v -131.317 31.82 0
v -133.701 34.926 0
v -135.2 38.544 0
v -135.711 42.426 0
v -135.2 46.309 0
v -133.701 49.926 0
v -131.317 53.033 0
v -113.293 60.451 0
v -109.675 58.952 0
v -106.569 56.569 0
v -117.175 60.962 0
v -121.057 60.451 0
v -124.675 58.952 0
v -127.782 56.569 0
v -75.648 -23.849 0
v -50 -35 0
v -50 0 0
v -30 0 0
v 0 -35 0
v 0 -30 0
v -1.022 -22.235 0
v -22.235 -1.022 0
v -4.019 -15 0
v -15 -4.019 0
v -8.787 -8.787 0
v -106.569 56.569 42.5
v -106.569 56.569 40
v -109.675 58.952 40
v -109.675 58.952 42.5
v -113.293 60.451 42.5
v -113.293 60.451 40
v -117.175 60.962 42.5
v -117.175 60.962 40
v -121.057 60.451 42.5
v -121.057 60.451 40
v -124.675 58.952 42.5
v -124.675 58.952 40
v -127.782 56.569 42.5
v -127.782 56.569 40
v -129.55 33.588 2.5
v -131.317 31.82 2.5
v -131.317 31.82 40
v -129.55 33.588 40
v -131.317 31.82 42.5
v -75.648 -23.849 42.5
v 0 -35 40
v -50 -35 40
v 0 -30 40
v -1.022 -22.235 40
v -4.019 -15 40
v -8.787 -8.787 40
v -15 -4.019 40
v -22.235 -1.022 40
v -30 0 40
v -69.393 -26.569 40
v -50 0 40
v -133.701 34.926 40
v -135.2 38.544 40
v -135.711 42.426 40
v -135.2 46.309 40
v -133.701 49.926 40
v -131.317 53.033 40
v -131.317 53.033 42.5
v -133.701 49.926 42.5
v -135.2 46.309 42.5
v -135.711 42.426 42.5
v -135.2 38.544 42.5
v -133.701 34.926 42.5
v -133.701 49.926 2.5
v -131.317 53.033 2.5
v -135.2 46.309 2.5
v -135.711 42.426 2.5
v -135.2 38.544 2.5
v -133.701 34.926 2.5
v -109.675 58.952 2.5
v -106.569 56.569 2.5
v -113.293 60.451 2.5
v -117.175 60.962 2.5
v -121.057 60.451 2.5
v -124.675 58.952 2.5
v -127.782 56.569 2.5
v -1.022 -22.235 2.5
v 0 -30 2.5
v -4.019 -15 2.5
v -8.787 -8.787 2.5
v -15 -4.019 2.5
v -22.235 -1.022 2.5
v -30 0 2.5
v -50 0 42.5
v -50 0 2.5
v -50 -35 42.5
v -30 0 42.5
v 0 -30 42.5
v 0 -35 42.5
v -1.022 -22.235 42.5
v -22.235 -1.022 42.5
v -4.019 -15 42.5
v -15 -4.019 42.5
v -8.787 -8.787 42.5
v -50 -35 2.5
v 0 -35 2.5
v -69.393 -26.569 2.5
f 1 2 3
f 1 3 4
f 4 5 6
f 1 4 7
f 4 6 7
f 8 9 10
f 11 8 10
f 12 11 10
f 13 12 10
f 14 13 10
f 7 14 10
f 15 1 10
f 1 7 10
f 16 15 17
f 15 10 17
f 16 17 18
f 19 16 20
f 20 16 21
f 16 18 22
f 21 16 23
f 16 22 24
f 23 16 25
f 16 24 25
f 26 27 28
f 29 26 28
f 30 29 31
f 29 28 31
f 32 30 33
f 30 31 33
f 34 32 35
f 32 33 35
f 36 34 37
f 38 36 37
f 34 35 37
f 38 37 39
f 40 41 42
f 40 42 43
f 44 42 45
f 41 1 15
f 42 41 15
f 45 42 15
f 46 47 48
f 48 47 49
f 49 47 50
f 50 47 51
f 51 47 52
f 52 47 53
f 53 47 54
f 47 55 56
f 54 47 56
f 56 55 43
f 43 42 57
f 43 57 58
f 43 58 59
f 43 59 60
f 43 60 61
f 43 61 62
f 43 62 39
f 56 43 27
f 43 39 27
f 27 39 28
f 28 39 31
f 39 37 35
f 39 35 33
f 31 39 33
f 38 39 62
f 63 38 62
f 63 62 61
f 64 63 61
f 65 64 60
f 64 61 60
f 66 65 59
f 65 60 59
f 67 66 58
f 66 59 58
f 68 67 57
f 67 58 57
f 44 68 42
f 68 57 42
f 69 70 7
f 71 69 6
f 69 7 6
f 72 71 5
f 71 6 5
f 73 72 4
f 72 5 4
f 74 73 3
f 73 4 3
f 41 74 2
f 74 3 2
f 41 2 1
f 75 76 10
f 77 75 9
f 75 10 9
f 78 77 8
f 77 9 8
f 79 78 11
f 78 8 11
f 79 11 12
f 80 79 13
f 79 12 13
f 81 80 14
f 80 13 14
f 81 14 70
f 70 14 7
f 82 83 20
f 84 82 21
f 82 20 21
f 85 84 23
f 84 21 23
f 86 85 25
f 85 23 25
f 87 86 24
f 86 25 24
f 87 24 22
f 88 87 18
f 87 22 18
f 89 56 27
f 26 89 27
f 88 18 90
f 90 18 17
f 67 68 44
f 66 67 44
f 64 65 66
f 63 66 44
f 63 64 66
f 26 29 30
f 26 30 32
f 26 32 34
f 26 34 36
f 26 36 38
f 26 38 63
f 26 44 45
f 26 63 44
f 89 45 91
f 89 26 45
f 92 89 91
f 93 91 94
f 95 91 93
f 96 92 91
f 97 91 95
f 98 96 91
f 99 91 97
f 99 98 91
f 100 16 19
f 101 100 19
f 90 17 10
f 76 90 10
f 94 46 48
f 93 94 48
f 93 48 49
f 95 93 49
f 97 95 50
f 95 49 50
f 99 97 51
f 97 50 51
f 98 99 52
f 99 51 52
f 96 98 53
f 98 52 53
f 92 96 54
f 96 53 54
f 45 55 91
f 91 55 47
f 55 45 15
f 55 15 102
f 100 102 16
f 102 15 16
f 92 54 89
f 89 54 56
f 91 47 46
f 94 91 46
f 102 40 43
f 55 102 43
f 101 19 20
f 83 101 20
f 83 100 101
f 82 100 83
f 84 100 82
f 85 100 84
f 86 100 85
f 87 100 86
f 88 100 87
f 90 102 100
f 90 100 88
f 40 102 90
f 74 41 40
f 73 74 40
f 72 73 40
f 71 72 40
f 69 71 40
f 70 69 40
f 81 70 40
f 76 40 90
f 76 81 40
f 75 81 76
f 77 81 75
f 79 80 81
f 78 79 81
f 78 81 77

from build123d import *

# Parameters (mm, degrees)
BOSS_EXTRUDE1_DEPTH = 42.5
SHELL3_START        = -130.355339059
SHELL3_OUTLINE_W    = 56.855339059
SHELL3_OUTLINE_H    = 37.5
SHELL3_DEPTH        = 155.104076401
SHELL3_2_OUTLINE_W  = 4.144660941
SHELL3_2_OUTLINE_H  = 37.5
SHELL3_2_DEPTH      = 15


# Read off the part's stored shape, not the designer's step: Shell3
with BuildPart() as part:
    # Sketch1 → Boss-Extrude1 (new body)
    with BuildSketch(Plane.XY):
        with BuildLine():
            Line((-30, 0), (-50, 0))
            Line((-50, 0), (-106.568542495, 56.568542495))
            ThreePointArc((-106.568542495, 56.568542495), (-117.175144213, 60.961940777), (-127.781745931, 56.568542495))
            Line((-127.781745931, 56.568542495), (-131.317279836, 53.033008589))
            ThreePointArc((-131.317279836, 53.033008589), (-135.710678119, 42.426406871), (-131.317279836, 31.819805153))
            Line((-131.317279836, 31.819805153), (-75.648177206, -23.849297477))
            Line((-75.648177206, -23.849297477), (-50, -35))
            Line((-50, -35), (0, -35))
            Line((0, -35), (0, -30))
            ThreePointArc((0, -30), (-8.786796564, -8.786796564), (-30, 0))
        make_face()
    extrude(amount=BOSS_EXTRUDE1_DEPTH)

    # Shell3 outline → Shell3 (cut)
    with BuildSketch(Plane(origin=(0, 0, 0), x_dir=(0.7071067811865431, 0.707106781186552, 0), z_dir=(0.707106781186552, -0.707106781186543, 0)).offset(SHELL3_START)):
        with Locations((-39.42766953, 21.25)):
            Rectangle(SHELL3_OUTLINE_W, SHELL3_OUTLINE_H)
    extrude(amount=SHELL3_DEPTH, mode=Mode.SUBTRACT)

    # Shell3 2 outline → Shell3 2 (cut)
    with BuildSketch(Plane(origin=(0, 0, 0), x_dir=(0.7071067811865431, 0.707106781186552, 0), z_dir=(0.707106781186552, -0.707106781186543, 0)).offset(SHELL3_START)):
        with Locations((-69.92766953, 21.25)):
            Rectangle(SHELL3_2_OUTLINE_W, SHELL3_2_OUTLINE_H)
    extrude(amount=SHELL3_2_DEPTH, mode=Mode.SUBTRACT)


solid = part.part
